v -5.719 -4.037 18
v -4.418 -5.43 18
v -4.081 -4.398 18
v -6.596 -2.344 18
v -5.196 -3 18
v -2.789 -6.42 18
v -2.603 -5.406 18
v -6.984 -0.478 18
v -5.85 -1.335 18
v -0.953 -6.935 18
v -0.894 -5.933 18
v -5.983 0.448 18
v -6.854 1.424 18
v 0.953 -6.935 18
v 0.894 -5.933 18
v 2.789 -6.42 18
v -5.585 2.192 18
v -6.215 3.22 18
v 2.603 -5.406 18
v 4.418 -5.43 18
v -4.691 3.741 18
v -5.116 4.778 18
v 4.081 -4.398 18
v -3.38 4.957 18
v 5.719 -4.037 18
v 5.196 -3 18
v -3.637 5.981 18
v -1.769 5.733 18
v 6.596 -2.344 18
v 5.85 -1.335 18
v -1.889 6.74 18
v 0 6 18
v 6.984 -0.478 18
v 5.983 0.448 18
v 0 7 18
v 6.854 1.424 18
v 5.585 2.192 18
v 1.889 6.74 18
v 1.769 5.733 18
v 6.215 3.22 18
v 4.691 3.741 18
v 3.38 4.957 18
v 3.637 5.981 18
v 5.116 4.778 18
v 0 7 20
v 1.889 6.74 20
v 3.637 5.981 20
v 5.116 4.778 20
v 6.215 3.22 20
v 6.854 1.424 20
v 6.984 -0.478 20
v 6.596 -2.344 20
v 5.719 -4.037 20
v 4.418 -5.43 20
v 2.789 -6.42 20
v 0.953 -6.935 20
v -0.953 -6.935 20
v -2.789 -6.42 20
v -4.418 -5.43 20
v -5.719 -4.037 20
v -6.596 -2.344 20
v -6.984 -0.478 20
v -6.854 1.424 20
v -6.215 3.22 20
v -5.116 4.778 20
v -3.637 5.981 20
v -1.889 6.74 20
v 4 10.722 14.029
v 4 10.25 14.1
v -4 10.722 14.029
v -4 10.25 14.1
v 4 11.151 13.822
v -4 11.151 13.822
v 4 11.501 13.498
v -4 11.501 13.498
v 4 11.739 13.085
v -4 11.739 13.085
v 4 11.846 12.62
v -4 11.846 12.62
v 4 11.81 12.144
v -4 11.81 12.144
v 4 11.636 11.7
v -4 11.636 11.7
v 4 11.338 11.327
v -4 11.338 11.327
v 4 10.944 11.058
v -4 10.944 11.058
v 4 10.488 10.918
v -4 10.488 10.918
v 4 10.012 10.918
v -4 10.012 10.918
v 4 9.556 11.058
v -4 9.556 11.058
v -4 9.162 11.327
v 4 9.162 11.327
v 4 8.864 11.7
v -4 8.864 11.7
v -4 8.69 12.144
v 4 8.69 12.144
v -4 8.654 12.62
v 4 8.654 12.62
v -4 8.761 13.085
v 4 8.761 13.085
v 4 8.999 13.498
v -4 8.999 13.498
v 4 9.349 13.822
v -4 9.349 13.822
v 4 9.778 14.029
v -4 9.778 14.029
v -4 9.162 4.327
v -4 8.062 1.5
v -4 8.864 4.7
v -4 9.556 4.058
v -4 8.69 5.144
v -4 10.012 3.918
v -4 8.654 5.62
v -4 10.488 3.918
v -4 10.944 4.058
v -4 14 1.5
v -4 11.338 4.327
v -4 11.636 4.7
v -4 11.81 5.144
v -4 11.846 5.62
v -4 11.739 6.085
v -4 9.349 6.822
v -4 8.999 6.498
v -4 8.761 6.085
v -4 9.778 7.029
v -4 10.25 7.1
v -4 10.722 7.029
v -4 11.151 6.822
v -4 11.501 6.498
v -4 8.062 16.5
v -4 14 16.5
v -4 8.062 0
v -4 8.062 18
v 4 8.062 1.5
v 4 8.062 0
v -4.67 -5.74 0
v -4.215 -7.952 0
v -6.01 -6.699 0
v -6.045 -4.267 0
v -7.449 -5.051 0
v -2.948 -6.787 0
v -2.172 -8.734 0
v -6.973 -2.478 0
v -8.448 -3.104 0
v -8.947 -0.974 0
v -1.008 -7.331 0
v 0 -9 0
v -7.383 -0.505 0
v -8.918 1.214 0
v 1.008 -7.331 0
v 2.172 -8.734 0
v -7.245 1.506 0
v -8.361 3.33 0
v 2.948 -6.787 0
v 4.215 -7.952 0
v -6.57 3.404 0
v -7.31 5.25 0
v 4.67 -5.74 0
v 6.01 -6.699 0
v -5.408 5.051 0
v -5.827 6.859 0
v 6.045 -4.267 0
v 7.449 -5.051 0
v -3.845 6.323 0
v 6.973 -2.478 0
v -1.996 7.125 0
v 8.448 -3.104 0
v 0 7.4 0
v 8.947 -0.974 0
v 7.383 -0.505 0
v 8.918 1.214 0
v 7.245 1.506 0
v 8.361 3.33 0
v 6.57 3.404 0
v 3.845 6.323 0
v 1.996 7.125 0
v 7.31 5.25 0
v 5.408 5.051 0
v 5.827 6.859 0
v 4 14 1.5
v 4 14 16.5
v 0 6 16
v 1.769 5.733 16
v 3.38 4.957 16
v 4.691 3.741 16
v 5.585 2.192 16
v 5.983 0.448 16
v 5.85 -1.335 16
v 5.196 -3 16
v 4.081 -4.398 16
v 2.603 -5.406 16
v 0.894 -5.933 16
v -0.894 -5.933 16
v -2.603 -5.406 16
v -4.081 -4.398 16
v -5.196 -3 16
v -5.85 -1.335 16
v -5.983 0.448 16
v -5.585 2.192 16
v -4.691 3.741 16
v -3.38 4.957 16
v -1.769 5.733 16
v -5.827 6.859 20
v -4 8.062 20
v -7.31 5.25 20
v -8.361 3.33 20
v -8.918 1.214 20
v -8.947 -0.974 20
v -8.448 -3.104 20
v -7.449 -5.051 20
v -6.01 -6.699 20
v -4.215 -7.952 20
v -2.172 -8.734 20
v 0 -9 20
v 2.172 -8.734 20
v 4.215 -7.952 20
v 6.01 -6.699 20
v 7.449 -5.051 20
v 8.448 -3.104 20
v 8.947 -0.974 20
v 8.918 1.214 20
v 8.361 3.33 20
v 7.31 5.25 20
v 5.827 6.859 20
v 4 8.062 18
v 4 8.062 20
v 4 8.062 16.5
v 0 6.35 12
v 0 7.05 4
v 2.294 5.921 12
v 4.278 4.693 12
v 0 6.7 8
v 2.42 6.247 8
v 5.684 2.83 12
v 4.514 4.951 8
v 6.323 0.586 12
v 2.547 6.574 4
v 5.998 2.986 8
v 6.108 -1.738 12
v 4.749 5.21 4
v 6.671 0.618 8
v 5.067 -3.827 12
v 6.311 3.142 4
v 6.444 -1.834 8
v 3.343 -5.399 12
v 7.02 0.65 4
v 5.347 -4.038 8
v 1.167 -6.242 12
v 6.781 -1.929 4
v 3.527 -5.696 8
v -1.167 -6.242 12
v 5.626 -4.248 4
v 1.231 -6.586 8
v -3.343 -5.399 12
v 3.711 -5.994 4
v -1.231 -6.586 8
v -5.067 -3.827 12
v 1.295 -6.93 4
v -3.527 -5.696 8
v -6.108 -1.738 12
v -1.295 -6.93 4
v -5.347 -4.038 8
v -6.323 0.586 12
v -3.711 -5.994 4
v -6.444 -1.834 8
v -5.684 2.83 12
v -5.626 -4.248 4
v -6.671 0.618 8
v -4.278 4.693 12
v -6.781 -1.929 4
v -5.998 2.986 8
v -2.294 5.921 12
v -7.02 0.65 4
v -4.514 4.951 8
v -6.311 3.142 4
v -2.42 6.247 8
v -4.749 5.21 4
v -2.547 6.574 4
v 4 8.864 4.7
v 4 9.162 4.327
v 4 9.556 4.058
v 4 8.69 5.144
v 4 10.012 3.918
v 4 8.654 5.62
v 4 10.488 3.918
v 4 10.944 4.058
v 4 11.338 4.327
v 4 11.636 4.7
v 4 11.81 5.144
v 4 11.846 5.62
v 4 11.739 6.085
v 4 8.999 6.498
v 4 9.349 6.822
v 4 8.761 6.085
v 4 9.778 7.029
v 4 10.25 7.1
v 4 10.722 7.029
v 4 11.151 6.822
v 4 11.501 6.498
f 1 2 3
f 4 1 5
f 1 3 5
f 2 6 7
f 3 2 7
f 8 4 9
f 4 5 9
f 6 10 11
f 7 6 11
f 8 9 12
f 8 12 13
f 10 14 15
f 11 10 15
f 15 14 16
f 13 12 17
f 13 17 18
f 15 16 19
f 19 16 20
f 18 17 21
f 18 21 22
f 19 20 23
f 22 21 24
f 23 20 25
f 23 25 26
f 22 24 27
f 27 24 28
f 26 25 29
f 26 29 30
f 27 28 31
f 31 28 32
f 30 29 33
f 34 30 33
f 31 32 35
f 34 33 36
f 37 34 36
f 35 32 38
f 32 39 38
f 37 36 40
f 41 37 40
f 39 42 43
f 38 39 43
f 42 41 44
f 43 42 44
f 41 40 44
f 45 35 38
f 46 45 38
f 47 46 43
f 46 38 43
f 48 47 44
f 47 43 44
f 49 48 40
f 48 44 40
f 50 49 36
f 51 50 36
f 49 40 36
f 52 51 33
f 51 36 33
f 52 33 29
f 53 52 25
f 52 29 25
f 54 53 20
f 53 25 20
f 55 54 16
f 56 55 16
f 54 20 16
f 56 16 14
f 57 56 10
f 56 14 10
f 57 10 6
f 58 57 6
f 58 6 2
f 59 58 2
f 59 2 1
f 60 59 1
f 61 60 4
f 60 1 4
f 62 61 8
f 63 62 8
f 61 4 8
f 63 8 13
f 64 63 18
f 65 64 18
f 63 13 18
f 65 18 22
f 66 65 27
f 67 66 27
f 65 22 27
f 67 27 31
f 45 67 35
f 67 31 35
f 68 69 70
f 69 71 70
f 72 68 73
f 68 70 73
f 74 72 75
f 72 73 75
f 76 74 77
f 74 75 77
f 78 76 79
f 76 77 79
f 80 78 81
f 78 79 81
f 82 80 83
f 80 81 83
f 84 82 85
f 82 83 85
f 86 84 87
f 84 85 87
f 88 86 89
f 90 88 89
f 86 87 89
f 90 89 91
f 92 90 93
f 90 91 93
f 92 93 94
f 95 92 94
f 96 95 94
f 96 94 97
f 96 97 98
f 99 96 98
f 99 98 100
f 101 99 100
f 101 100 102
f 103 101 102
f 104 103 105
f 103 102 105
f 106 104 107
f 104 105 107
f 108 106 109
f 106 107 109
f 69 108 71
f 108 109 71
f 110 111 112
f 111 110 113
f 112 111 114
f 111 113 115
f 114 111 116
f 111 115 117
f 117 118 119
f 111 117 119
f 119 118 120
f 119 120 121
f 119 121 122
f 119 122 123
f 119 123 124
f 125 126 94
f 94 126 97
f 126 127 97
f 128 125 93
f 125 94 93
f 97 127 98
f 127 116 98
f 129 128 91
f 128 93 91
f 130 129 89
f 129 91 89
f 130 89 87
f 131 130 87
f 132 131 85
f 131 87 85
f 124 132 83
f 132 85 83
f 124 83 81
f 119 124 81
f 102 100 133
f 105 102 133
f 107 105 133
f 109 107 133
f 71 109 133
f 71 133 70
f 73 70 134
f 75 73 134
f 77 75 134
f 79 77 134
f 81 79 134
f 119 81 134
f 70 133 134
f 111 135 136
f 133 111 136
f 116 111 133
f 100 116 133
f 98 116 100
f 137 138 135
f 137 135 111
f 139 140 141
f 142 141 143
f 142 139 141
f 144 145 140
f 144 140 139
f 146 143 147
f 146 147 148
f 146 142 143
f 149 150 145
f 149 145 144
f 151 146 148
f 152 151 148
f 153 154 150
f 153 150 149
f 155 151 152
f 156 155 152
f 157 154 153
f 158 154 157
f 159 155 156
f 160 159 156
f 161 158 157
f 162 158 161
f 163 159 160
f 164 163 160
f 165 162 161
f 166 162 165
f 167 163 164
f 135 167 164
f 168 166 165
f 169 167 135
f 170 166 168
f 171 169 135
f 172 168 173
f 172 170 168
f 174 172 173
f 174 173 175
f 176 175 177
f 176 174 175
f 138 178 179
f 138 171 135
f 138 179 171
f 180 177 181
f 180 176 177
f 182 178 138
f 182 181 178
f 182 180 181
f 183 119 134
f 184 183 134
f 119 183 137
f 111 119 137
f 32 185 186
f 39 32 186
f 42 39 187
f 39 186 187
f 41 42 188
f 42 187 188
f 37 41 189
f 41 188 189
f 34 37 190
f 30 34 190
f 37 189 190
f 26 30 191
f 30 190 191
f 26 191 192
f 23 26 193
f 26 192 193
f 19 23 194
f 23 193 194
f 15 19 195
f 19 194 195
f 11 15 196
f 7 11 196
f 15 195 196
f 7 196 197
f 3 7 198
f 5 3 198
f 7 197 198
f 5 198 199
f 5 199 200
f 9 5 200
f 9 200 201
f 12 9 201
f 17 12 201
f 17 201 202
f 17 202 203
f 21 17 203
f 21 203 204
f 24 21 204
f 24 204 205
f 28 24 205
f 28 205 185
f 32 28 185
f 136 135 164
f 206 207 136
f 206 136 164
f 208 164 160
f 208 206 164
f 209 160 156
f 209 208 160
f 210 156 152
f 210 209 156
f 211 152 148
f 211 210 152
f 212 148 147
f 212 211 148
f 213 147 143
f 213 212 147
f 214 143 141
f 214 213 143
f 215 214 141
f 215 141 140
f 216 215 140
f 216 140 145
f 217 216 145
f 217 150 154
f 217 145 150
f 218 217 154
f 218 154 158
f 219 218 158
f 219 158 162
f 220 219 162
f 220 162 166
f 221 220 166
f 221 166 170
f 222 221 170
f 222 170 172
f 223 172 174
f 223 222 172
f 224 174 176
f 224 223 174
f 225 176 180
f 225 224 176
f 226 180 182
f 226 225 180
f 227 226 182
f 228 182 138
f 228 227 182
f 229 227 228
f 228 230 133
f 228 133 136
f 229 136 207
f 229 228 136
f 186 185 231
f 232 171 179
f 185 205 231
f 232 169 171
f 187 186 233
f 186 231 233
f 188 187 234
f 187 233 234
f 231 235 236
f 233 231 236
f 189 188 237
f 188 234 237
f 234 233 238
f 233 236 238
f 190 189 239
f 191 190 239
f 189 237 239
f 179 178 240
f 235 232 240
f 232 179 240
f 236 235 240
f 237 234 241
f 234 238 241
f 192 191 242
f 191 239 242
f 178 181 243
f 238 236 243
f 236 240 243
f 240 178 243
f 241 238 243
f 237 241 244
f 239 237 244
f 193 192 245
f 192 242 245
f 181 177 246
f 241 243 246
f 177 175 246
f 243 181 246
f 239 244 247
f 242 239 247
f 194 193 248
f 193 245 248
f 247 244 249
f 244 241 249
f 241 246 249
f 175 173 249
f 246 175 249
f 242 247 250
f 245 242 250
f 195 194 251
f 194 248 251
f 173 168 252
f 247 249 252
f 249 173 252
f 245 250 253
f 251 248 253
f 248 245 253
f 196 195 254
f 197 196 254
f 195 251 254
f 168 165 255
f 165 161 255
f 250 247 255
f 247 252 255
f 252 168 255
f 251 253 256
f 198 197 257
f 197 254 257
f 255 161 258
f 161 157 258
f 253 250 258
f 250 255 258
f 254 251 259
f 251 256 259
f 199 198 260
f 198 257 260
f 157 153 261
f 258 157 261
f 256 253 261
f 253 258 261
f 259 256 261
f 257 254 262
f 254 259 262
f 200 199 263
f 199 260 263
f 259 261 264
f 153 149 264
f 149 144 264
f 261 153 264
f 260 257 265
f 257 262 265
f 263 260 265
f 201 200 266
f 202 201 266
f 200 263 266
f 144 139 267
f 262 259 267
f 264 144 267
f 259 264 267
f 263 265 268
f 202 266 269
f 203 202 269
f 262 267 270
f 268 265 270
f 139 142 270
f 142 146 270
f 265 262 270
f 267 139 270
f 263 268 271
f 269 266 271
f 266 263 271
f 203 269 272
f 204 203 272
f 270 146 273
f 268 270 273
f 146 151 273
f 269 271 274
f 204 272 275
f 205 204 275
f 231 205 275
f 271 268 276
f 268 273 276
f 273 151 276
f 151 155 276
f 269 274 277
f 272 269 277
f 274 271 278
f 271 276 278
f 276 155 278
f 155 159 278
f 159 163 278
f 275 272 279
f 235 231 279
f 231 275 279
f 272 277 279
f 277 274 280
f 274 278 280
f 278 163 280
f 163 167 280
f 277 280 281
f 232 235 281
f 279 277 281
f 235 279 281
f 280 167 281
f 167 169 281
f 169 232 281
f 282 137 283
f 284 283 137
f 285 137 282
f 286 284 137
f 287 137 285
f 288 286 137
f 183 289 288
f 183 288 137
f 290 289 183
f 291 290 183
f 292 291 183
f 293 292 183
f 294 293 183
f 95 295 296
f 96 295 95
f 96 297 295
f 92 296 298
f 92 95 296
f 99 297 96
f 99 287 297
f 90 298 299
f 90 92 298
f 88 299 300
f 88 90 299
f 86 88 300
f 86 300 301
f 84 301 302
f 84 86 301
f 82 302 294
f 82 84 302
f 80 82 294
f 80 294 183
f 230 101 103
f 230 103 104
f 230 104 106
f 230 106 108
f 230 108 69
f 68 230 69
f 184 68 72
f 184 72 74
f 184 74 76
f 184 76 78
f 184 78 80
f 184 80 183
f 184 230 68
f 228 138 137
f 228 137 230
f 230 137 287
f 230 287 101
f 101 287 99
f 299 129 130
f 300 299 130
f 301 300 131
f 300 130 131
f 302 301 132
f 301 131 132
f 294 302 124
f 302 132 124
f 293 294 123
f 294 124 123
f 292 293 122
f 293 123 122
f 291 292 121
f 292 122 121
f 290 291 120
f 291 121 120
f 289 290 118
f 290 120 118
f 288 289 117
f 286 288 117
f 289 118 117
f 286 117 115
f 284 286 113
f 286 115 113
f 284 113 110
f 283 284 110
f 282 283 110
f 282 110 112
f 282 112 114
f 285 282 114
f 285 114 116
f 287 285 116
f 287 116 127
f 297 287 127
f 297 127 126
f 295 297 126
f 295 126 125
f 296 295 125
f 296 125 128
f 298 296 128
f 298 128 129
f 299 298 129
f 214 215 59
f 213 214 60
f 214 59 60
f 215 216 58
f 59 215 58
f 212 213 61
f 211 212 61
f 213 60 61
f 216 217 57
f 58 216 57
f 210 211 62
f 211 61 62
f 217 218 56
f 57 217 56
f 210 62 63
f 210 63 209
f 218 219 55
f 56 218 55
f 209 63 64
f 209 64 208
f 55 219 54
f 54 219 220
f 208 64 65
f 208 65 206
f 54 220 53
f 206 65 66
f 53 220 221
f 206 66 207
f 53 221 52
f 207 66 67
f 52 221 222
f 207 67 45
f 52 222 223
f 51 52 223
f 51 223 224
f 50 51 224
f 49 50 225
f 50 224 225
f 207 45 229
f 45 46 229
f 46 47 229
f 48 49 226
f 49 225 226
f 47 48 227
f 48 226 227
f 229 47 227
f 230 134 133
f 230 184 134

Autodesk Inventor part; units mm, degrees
ref_plane "YZ Plane" through (0, 0, 0) normal (1, 0, 0) x (0, 1, 0)
ref_plane "XZ Plane" through (0, 0, 0) normal (0, 1, 0) x (-1, 0, 0)
ref_plane "XY Plane" through (0, 0, 0) normal (0, 0, 1) x (1, 0, 0)
sketch "Sketch1" plane through (0, 0, 0) normal (1, 0, 0) x (0, 1, 0)
  line L0 (0, 18) -> (5.825, 18) construction
  line L1 (0, 0) -> (7.3998, 0) construction
  line L2 (0, 12.5) -> (0, 0) construction
  line L3 (7.3998, 0) -> (9, 0) construction
  line L4 (9, 0) -> (9, 18)
  line L5 (9, 18) -> (9, 18)
  line L6 (9, 18) -> (9, 20)
  line L7 (9, 20) -> (7, 20)
  line L8 (7, 20) -> (7, 18)
  line L9 (5.825, 18) -> (7, 18) construction
  line L10 (5.825, 18) -> (7.3998, 0) construction
  line L11 (6, 18) -> (7, 18)
  line L12 (6, 16) -> (7.3998, 0)
  line L13 (9, 0) -> (7.3998, 0)
  line L14 (6, 18) -> (6, 16)
  point P0 (2.25, 0)
  dimension "d2" = 18
  dimension "d12" = 2
  dimension "d14" = 0
  dimension "d16" = 2
  dimension "d17" = 7
  dimension "d35" = 95
  dimension "d36" = 9
  dimension "d57" = 2
  dimension "d60" = 6
revolve "Revolution1" add sketch "Sketch1" angle 360 about axis through (0, 0, 12.5) along (0, 0, -1)
sketch "Sketch3" plane through (0, 0, 0) normal (1, 0, 0) x (0, 1, 0)
  line L0 (14, 0) -> (14, 18)
  line L1 (14, 18) -> (7.3998, 18)
  line L2 (14, 0) -> (7.3998, 0)
  line L3 (-7.3998, 0) -> (7.3998, 0) projected
  line L4 (7.3998, 0) -> (7.3998, 18)
  line L5 (-6, 18) -> (6, 18) projected
  point P0 (0, 0)
  dimension "d28" = 14
extrude "Extrusion1" add sketch "Sketch3" along normal mid plane 8
sketch "Sketch4" plane through (-4, 0, 0) normal (-1, 0, 0) x (0, 0, 1)
  circle A0 centre (5.5, 10.25) radius 1.6
  circle A1 centre (12.5, 10.25) radius 1.6
  line L0 (5.5, 10.25) -> (12.5, 10.25) construction
  line L1 (18, 14) -> (0, 14) construction
  point P0 (0, 0)
  point P1 (17, 10.25)
  point P2 (9, 10.25)
  point P3 (9, 14)
  dimension "d29" = 3.2
  dimension "d30" = 3.2
  dimension "d31" = 7
  dimension "d34" = 3.75
extrude "Extrusion2" cut sketch "Sketch4" against normal blind 10
sketch "Sketch5" plane through (4, 0, 0) normal (1, 0, 0) x (0, 0, -1)
  circle A0 centre (-5.5, 10.25) radius 1.6 projected
  circle A1 centre (-12.5, 10.25) radius 1.6 projected
  line L0 (0, 8.0623) -> (-18, 8.0623) projected
  line L1 (-20.496, 14) -> (-16.5, 14)
  line L2 (-16.5, 14) -> (-16.5, 8.0623)
  line L3 (-16.5, 8.0623) -> (-20.496, 8.0623)
  line L4 (-20.496, 8.0623) -> (-20.496, 14)
  line L5 (0, 14) -> (-1.5, 14)
  line L6 (-1.5, 14) -> (-1.5, 8.0623)
  line L7 (-1.5, 8.0623) -> (0, 8.0623)
  line L8 (0, 8.0623) -> (0, 14)
  line L9 (0, 14) -> (-18, 14) projected
  point P0 (0, 0)
  dimension "d47" = 15
  dimension "d49" = 4
  dimension "d50" = 4
extrude "Extrusion3" cut sketch "Sketch5" against normal blind 10 contours L0 L6 L5 L8 | L0 L3 L4 L1 L2
equation "\"d49\" = d50"
properties part number "brush holder v4"
